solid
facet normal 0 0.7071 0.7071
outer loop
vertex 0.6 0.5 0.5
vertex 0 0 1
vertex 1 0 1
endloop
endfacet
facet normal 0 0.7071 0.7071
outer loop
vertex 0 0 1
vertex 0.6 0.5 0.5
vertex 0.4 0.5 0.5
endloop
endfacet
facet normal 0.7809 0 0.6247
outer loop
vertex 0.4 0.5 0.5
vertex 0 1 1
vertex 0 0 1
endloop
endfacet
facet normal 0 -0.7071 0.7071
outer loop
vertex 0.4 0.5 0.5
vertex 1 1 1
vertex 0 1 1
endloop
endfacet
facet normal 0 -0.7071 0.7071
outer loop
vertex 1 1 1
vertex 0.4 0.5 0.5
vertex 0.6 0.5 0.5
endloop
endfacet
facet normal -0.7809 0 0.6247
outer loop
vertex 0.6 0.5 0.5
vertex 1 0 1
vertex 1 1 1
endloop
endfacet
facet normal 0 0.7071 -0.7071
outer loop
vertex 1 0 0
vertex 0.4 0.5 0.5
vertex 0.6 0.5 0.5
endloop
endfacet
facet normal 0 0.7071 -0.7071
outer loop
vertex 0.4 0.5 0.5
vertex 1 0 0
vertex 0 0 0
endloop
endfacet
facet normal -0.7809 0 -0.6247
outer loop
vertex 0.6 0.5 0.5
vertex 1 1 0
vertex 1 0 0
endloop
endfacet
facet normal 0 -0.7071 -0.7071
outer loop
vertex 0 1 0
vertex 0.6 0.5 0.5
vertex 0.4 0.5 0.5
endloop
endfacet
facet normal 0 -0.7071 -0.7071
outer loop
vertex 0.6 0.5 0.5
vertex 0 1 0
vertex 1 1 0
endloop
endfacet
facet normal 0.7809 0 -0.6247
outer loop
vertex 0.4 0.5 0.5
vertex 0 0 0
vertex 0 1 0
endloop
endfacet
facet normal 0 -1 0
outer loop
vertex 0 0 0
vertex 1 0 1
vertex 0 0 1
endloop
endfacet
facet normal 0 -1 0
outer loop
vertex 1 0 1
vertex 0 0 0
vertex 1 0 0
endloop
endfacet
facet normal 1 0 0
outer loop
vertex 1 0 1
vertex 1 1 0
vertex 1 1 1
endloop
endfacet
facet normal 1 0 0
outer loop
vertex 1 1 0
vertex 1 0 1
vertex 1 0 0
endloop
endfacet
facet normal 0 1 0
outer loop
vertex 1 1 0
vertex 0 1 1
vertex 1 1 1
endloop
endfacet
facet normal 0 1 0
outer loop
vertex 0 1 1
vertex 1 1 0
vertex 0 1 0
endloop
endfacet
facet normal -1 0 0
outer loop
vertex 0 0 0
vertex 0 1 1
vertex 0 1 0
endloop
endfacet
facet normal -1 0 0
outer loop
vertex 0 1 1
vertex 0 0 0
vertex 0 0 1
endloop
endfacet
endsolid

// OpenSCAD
polyhedron(
  points=[
    [0, 0, 0],
    [1, 0, 0],
    [0, 1, 0],
    [1, 1, 0],

    [0, 0, 1],
    [1, 0, 1],
    [0, 1, 1],
    [1, 1, 1],

    [0.4, 0.5, 0.5],
    [0.6, 0.5, 0.5],
  ],
  faces=[
    [5,4,8,9],
    [4,6,8],
    [6,7,9,8],
    [7,5,9],
    
    [0,1,9,8],
    [1,3,9],
    [3,2,8,9],
    [2,0,8],
    
    [4,5,1,0],
    [5,7,3,1],
    [7,6,2,3],
    [6,4,0,2],
  ]);
